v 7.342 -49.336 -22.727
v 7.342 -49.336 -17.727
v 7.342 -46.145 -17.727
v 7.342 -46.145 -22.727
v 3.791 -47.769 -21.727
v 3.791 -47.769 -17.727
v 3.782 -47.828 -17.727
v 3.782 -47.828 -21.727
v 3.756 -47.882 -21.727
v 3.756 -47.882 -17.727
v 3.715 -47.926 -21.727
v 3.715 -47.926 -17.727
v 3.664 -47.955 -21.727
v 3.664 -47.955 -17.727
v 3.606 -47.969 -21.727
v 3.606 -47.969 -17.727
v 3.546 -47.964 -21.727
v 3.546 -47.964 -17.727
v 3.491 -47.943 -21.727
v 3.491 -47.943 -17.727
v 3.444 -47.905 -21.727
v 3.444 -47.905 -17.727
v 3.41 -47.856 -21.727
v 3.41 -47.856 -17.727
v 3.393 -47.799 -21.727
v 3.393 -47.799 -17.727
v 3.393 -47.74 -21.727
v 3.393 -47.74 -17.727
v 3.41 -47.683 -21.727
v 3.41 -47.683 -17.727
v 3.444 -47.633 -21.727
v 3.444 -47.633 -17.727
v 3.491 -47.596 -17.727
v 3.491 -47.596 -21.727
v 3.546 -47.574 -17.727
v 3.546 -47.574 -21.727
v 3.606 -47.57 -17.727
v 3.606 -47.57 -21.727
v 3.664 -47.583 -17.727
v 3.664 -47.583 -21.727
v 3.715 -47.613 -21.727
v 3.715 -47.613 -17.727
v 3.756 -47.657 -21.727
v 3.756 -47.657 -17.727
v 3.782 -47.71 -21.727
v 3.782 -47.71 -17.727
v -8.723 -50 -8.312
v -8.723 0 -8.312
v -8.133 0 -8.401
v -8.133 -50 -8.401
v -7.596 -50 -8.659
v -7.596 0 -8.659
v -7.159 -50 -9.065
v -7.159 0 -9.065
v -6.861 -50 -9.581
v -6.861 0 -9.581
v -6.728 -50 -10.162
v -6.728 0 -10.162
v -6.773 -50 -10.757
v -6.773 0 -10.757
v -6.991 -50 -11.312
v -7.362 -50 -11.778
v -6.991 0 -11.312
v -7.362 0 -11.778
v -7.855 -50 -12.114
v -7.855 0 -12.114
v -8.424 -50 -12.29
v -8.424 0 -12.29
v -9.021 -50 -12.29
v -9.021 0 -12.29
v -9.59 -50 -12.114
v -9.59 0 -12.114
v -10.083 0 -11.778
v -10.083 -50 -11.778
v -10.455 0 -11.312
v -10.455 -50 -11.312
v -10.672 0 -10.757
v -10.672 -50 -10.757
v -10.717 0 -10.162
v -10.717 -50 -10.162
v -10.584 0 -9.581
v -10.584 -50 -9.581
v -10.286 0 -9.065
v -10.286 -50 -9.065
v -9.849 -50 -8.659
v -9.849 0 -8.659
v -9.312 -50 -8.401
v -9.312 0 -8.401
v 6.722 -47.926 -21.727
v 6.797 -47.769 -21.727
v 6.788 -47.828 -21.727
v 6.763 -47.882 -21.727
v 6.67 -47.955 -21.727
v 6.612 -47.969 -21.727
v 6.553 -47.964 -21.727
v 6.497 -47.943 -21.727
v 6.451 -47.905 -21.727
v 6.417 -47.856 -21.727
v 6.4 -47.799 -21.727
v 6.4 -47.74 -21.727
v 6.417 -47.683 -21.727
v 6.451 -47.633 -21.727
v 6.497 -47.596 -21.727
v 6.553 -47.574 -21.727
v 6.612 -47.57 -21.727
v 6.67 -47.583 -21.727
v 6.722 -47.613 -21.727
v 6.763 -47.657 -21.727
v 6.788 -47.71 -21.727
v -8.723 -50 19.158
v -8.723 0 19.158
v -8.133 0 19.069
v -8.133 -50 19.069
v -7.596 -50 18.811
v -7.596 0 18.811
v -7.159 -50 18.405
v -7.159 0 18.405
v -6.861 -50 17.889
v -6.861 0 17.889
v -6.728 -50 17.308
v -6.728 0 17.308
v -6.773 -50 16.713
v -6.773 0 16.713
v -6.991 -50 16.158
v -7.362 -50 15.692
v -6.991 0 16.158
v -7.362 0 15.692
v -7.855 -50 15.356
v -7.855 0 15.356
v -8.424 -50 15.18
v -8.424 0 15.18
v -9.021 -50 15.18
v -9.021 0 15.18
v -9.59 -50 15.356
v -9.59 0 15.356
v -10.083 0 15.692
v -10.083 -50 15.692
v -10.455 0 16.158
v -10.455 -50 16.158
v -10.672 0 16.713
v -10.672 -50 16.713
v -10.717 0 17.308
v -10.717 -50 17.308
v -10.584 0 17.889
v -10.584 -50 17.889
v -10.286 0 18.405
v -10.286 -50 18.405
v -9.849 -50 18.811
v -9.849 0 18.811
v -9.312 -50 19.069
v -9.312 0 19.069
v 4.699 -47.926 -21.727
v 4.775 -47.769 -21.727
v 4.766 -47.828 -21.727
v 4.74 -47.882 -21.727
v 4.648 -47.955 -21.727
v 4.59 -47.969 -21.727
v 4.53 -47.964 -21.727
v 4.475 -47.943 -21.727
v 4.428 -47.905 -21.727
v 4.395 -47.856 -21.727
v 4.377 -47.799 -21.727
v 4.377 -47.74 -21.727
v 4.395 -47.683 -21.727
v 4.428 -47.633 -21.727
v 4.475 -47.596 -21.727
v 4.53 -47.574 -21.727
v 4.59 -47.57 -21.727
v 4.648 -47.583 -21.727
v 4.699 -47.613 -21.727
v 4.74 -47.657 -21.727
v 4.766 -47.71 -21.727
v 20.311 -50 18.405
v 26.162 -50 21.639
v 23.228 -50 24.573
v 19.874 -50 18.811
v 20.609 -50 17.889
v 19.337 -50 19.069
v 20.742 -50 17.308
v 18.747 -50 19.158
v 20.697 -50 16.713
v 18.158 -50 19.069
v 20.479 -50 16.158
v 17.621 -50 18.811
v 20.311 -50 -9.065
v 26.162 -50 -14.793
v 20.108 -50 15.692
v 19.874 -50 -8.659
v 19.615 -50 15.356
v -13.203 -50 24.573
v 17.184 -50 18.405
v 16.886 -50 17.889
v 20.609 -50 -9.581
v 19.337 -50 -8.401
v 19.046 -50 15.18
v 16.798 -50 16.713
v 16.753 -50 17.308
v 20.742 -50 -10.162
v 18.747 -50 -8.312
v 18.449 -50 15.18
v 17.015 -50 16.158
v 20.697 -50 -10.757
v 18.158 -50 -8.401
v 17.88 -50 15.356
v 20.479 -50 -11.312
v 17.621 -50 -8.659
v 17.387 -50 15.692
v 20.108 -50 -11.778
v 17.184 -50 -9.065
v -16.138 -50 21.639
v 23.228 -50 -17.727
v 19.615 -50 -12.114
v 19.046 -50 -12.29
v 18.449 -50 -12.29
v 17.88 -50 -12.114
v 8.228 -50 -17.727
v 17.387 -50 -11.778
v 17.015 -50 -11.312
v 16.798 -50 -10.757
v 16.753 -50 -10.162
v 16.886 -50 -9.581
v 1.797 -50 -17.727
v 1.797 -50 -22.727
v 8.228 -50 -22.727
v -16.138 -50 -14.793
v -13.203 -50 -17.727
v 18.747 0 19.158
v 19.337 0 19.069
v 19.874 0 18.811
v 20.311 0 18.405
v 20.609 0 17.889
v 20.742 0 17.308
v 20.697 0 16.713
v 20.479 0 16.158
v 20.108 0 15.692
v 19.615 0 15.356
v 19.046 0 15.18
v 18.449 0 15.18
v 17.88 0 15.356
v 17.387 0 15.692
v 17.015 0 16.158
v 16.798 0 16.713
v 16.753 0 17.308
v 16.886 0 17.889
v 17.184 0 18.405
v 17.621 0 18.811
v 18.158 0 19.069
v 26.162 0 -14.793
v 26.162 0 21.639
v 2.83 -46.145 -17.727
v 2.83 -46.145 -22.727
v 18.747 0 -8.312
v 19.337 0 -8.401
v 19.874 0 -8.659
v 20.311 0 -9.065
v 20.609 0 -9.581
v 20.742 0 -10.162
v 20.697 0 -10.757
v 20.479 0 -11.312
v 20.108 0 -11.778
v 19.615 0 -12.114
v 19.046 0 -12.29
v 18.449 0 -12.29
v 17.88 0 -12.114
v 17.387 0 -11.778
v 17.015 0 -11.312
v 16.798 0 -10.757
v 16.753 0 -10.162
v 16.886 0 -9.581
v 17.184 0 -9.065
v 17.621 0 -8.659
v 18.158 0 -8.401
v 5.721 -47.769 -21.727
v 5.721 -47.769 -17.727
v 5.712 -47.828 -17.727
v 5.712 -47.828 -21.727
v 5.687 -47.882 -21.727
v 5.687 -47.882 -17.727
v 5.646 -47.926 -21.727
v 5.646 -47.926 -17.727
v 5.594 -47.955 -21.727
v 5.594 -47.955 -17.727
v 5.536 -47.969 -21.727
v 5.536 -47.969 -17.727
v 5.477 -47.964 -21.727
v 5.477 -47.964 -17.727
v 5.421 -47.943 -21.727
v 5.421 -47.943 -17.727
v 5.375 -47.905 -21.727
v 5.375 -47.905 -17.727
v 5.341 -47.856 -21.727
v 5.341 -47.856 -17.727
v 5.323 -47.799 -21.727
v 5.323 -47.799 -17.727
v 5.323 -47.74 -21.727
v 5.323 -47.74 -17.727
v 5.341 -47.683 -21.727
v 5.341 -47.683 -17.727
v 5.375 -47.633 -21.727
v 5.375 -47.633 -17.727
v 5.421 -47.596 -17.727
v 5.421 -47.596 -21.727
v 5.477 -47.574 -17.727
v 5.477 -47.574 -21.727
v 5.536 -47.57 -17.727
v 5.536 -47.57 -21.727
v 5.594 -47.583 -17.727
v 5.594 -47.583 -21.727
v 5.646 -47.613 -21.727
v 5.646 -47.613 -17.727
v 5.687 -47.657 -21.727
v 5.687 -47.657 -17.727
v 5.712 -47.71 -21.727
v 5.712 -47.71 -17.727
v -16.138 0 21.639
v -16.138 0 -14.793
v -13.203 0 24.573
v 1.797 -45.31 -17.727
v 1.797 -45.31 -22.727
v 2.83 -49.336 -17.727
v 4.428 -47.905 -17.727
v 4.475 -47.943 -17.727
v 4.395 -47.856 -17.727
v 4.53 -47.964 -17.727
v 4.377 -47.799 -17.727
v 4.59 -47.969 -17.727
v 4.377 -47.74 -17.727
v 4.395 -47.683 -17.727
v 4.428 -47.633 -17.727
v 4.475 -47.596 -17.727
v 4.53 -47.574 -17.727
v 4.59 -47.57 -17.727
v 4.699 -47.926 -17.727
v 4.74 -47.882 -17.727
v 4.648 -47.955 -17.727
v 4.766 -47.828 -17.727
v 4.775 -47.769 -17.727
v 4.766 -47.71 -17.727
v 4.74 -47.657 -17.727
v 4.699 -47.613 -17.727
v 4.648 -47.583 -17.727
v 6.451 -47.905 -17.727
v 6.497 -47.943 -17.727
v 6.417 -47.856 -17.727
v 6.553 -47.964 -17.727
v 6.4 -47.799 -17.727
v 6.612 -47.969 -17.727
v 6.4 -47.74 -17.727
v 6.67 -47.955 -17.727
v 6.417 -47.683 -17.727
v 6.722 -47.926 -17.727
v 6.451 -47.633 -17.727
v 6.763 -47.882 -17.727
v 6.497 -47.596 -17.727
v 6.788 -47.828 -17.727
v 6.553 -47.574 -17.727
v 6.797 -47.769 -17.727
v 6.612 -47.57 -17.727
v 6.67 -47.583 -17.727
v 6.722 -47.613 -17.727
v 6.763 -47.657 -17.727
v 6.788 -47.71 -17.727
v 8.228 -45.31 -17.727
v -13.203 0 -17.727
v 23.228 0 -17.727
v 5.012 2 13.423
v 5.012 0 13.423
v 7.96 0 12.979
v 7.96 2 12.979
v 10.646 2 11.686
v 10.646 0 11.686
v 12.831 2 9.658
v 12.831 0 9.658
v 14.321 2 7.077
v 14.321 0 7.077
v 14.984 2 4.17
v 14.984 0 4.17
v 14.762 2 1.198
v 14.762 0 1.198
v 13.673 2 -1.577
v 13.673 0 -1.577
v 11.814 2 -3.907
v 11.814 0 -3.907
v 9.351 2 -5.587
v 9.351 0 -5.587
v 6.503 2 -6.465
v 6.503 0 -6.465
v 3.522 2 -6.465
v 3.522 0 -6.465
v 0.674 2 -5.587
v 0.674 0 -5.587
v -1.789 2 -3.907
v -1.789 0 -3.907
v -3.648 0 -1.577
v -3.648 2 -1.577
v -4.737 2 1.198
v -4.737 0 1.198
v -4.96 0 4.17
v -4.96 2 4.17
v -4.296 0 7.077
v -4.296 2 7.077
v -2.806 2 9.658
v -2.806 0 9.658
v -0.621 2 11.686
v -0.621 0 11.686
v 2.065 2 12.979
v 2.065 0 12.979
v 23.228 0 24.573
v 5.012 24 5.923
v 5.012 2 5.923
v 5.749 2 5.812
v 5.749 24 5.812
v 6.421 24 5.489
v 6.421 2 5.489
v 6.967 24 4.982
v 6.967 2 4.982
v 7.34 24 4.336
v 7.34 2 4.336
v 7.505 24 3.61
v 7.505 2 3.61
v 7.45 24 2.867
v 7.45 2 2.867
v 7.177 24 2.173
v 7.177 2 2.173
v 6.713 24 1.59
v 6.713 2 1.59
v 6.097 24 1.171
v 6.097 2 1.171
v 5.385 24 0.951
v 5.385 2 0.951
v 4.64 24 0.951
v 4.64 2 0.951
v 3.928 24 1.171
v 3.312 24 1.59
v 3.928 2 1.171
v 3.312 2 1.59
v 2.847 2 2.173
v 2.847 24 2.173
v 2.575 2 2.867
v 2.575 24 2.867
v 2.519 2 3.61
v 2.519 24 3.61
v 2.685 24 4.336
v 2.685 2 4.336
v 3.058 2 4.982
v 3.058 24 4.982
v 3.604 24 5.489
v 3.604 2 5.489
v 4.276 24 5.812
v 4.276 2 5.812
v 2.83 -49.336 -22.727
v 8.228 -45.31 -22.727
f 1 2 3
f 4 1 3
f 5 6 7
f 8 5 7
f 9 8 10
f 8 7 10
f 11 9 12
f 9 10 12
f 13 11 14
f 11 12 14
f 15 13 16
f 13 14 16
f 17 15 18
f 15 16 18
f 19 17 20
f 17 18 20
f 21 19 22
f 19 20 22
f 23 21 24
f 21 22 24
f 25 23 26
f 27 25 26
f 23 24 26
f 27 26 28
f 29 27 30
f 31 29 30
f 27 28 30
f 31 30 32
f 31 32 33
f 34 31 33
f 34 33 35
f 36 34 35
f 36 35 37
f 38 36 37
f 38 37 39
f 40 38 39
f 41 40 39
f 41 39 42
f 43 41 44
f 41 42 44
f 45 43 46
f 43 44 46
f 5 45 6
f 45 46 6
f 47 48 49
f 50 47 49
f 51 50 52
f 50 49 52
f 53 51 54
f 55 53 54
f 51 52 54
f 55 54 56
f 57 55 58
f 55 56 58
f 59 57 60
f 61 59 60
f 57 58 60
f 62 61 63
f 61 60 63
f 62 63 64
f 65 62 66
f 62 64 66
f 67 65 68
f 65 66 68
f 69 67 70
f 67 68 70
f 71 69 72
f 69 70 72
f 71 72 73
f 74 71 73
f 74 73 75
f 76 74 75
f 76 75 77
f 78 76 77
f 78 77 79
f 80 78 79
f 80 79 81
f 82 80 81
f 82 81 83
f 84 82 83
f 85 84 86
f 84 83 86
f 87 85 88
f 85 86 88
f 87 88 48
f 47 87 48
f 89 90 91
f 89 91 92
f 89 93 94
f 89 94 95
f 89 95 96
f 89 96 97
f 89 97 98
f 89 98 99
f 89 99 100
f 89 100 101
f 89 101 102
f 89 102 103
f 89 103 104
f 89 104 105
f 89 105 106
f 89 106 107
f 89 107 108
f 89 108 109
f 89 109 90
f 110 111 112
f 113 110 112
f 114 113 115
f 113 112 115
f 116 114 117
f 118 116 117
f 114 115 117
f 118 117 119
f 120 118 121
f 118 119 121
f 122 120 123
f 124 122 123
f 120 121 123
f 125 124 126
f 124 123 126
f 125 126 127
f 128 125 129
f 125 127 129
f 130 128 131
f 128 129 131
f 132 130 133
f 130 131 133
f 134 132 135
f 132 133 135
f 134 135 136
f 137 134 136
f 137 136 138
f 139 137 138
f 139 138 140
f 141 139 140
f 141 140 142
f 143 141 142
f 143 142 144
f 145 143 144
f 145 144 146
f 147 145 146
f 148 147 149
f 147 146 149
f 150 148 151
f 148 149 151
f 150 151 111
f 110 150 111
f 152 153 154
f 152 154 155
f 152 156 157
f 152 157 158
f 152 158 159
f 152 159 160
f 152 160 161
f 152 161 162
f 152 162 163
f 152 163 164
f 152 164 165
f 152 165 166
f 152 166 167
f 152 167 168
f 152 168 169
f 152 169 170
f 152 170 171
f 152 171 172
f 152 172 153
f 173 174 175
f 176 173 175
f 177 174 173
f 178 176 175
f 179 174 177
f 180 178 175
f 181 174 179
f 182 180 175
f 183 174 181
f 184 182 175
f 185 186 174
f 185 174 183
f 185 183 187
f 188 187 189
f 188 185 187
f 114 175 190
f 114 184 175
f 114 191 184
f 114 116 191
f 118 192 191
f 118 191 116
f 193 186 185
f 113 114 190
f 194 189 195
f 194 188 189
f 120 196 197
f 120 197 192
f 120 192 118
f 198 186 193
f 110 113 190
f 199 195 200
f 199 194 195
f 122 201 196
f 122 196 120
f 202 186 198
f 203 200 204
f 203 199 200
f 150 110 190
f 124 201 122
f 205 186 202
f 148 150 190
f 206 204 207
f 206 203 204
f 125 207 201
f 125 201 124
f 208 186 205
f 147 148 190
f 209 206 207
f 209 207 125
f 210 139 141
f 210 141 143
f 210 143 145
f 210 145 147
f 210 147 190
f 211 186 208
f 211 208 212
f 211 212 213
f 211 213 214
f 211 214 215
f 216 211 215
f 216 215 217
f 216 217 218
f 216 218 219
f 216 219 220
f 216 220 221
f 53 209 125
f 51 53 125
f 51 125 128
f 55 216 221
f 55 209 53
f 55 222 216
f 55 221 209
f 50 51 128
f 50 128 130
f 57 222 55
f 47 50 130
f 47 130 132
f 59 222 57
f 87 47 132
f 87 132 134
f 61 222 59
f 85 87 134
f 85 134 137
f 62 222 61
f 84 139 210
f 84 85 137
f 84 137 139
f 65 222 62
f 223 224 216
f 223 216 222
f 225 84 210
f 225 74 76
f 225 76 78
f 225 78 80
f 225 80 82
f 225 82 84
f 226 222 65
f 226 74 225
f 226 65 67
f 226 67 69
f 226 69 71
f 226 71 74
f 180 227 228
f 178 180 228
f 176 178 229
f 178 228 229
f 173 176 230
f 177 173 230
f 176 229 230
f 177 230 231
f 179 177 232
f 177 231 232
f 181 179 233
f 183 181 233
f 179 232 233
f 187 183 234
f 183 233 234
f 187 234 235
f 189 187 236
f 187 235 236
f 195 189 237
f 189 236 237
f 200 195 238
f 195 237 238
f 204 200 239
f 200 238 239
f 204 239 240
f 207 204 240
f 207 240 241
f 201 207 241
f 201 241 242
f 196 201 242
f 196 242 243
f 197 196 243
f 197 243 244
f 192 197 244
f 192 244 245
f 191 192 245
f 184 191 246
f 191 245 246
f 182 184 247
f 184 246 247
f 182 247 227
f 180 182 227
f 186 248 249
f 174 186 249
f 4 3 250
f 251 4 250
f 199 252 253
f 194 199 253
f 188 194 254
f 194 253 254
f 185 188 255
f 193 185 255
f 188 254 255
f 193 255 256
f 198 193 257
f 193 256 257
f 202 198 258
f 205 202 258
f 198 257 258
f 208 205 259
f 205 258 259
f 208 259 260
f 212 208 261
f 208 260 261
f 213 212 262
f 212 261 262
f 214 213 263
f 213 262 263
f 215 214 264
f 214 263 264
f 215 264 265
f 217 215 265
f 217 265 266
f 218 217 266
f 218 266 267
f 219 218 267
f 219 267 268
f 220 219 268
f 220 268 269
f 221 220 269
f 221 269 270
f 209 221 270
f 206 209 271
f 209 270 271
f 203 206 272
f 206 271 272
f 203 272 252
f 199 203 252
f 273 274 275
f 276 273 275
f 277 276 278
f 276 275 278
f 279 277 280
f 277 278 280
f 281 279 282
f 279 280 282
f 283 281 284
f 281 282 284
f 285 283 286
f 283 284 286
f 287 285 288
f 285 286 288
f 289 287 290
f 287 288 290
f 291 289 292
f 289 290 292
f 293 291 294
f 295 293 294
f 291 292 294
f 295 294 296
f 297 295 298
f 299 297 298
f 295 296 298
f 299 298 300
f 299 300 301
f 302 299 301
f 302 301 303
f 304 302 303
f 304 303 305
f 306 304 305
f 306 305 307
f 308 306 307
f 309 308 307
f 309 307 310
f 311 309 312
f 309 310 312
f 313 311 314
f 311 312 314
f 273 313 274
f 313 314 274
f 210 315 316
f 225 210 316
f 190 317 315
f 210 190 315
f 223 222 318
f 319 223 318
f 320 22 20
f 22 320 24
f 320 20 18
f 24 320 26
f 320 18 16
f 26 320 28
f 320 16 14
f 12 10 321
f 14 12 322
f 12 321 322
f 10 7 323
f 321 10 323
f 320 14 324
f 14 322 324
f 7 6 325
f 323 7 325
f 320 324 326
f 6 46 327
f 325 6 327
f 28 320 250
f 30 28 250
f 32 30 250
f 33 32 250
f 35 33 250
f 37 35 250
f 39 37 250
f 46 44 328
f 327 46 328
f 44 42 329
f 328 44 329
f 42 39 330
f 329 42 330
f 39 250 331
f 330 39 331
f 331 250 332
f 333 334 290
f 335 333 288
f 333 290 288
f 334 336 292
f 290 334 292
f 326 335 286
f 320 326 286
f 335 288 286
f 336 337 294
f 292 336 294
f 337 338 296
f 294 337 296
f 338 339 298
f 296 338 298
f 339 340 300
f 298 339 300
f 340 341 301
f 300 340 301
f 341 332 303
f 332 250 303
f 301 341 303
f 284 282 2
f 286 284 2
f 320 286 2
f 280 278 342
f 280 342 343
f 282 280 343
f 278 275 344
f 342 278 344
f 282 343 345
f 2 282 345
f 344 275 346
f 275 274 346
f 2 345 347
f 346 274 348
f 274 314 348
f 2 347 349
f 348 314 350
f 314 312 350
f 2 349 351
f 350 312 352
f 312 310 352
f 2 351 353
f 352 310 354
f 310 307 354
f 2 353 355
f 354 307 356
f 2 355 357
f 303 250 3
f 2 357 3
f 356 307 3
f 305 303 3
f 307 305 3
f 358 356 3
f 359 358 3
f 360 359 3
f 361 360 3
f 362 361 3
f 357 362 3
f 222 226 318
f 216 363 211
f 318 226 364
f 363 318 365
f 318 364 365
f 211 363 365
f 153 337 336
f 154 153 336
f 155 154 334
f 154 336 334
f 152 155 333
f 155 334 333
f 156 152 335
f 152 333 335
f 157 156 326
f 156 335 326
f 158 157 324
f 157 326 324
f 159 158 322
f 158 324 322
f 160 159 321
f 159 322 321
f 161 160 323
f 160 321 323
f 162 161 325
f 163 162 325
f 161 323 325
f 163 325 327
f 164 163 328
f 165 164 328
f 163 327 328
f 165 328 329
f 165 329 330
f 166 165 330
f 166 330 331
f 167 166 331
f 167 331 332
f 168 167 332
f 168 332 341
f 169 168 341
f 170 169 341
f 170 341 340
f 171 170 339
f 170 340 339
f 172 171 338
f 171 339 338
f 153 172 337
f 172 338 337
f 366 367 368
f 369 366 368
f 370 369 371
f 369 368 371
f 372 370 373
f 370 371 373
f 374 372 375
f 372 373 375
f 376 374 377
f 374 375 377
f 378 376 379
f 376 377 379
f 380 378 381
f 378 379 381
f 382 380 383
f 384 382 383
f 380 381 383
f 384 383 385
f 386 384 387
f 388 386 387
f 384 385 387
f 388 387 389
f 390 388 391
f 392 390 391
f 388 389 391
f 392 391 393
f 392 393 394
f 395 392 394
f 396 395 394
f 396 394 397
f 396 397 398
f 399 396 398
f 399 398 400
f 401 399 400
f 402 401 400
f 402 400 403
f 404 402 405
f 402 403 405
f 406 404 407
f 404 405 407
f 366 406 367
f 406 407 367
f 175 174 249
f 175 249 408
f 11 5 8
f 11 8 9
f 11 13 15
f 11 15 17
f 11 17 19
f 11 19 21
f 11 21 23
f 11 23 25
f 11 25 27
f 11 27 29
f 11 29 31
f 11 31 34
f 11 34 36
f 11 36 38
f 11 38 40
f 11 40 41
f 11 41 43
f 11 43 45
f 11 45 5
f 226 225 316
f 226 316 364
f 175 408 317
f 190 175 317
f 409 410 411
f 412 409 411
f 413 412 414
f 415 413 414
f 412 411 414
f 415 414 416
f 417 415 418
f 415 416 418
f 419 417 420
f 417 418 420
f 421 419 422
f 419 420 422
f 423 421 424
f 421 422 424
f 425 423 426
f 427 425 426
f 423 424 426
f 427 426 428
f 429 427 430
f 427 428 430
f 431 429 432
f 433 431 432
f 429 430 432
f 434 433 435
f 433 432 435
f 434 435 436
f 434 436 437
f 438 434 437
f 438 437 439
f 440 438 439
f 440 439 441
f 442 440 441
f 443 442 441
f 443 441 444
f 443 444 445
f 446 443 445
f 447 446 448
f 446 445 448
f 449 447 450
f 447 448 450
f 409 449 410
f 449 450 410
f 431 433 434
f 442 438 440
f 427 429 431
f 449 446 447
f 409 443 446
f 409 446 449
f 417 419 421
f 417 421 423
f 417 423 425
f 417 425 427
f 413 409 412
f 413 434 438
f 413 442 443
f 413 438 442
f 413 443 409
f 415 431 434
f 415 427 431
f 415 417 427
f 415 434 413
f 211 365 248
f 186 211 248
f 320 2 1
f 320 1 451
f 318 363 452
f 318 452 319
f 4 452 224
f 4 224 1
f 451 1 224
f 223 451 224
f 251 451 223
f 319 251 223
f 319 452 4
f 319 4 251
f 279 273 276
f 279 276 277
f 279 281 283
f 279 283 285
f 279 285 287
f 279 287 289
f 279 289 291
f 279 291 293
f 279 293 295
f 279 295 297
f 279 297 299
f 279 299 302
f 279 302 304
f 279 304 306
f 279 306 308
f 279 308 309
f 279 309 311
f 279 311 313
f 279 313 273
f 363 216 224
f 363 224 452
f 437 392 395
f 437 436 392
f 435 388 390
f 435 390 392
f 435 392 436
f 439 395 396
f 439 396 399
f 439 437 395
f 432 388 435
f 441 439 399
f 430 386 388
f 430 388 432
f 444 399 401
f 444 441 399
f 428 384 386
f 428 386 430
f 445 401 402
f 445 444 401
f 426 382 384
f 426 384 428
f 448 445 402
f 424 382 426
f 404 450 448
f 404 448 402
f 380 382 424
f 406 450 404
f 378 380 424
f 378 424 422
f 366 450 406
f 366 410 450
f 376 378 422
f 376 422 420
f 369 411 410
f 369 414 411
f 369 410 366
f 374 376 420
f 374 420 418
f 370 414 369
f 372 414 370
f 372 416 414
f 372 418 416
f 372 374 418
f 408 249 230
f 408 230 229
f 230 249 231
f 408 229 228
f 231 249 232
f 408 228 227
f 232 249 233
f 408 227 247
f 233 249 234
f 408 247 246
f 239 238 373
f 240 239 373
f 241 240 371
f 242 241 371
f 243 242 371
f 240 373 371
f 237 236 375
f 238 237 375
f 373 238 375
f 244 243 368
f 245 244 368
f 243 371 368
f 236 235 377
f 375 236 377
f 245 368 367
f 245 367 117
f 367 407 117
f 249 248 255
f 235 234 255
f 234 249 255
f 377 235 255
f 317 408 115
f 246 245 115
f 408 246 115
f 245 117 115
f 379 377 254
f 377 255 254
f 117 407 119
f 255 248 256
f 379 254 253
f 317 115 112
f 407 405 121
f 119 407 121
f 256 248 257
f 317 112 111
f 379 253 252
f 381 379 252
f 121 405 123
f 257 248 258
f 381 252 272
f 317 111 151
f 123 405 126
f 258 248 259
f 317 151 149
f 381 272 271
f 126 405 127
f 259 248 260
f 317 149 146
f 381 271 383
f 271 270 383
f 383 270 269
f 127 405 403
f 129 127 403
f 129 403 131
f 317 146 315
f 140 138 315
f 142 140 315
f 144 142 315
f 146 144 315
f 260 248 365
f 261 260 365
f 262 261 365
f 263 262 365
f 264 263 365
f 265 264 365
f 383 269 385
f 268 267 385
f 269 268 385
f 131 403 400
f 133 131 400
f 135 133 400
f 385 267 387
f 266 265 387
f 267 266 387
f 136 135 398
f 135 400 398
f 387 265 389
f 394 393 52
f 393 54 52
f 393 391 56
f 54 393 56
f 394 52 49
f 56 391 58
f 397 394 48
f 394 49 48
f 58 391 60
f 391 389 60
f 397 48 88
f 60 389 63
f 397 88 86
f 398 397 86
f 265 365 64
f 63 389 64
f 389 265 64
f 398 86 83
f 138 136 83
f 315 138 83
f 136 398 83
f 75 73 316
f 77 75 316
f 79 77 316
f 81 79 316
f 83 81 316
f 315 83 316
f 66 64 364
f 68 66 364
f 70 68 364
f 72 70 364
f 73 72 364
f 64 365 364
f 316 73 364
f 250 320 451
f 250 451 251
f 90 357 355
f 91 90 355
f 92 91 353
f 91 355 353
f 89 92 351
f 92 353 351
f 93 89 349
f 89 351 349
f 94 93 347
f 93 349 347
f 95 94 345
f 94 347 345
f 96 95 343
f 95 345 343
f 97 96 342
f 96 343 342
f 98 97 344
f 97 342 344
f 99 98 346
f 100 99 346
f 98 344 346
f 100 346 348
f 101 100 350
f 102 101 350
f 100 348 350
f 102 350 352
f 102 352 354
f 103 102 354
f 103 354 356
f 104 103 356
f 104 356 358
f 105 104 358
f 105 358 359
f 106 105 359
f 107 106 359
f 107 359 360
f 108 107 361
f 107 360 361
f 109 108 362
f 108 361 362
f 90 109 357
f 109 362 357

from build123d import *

# Parameters (mm, degrees)
SKETCH_1_R      = 10
EXTRUDE_2_DEPTH = 2
SKETCH_1_6_R    = 2
EXTRUDE_5_DEPTH = 50
SKETCH_8_W      = 6.431791907
SKETCH_8_H      = 4.68965636
SKETCH_8_W_2    = 4.511669879
SKETCH_8_H_2    = 3.190584844
EXTRUDE_7_DEPTH = 5
SKETCH_10_R     = 0.2
EXTRUDE_8_DEPTH = 4
SKETCH_11_R     = 2.5
EXTRUDE_9_DEPTH = 22


with BuildPart() as part:
    # 草图1 → 凸台-拉伸2 (new body)
    with BuildSketch(Plane(origin=(0, 0, 0), x_dir=(1, 0, 0), z_dir=(0, 1, 0))):
        with Locations((5.012427746, -3.423121387)):
            Circle(SKETCH_1_R)
    extrude(amount=EXTRUDE_2_DEPTH)

    # 草图1<6> → 凸台-拉伸5 (add)
    with BuildSketch(Plane(origin=(0, 0, 0), x_dir=(1, 0, 0), z_dir=(0, 1, 0))):
        Polygon((-16.137572254, -21.639017341), (-16.137572254, 14.792774566), (-13.203468208, 17.726878613), (23.228323699, 17.726878613), (26.162427746, 14.792774566), (26.162427746, -21.639017341), (23.228323699, -24.573121387), (-13.203468208, -24.573121387), align=None)
        with Locations((-8.722572254, -17.158121387)):
            Circle(SKETCH_1_6_R, mode=Mode.SUBTRACT)
        with Locations((-8.722572254, 10.311878613)):
            Circle(SKETCH_1_6_R, mode=Mode.SUBTRACT)
        with Locations((18.747427746, -17.158121387)):
            Circle(SKETCH_1_6_R, mode=Mode.SUBTRACT)
        with Locations((18.747427746, 10.311878613)):
            Circle(SKETCH_1_6_R, mode=Mode.SUBTRACT)
    extrude(amount=-EXTRUDE_5_DEPTH)

    # 草图8 → 凸台-拉伸7 (add)
    with BuildSketch(Plane(origin=(0, 0, -17.726878613), x_dir=(-1, 0, 0), z_dir=(0, 0, -1))):
        with Locations((-5.012427746, -47.65517182)):
            Rectangle(SKETCH_8_W, SKETCH_8_H)
        with Locations((-5.085720746, -47.740684826)):
            Rectangle(SKETCH_8_W_2, SKETCH_8_H_2, mode=Mode.SUBTRACT)
    extrude(amount=EXTRUDE_7_DEPTH)

    # 草图10 → 凸台-拉伸8 (add)
    with BuildSketch(Plane(origin=(0, 0, -17.726878613), x_dir=(-1, 0, 0), z_dir=(0, 0, -1))):
        with Locations((-6.597292785, -47.769314004)):
            Circle(SKETCH_10_R)
        with Locations((-5.521254618, -47.769314004)):
            Circle(SKETCH_10_R)
        with Locations((-4.574749057, -47.769314004)):
            Circle(SKETCH_10_R)
        with Locations((-3.590639555, -47.769314004)):
            Circle(SKETCH_10_R)
    extrude(amount=EXTRUDE_8_DEPTH)

    # 草图11 → 凸台-拉伸9 (add)
    with BuildSketch(Plane(origin=(0, 2, 0), x_dir=(1, 0, 0), z_dir=(0, 1, 0))):
        with Locations((5.012427746, -3.423121387)):
            Circle(SKETCH_11_R)
    extrude(amount=EXTRUDE_9_DEPTH)


solid = part.part
